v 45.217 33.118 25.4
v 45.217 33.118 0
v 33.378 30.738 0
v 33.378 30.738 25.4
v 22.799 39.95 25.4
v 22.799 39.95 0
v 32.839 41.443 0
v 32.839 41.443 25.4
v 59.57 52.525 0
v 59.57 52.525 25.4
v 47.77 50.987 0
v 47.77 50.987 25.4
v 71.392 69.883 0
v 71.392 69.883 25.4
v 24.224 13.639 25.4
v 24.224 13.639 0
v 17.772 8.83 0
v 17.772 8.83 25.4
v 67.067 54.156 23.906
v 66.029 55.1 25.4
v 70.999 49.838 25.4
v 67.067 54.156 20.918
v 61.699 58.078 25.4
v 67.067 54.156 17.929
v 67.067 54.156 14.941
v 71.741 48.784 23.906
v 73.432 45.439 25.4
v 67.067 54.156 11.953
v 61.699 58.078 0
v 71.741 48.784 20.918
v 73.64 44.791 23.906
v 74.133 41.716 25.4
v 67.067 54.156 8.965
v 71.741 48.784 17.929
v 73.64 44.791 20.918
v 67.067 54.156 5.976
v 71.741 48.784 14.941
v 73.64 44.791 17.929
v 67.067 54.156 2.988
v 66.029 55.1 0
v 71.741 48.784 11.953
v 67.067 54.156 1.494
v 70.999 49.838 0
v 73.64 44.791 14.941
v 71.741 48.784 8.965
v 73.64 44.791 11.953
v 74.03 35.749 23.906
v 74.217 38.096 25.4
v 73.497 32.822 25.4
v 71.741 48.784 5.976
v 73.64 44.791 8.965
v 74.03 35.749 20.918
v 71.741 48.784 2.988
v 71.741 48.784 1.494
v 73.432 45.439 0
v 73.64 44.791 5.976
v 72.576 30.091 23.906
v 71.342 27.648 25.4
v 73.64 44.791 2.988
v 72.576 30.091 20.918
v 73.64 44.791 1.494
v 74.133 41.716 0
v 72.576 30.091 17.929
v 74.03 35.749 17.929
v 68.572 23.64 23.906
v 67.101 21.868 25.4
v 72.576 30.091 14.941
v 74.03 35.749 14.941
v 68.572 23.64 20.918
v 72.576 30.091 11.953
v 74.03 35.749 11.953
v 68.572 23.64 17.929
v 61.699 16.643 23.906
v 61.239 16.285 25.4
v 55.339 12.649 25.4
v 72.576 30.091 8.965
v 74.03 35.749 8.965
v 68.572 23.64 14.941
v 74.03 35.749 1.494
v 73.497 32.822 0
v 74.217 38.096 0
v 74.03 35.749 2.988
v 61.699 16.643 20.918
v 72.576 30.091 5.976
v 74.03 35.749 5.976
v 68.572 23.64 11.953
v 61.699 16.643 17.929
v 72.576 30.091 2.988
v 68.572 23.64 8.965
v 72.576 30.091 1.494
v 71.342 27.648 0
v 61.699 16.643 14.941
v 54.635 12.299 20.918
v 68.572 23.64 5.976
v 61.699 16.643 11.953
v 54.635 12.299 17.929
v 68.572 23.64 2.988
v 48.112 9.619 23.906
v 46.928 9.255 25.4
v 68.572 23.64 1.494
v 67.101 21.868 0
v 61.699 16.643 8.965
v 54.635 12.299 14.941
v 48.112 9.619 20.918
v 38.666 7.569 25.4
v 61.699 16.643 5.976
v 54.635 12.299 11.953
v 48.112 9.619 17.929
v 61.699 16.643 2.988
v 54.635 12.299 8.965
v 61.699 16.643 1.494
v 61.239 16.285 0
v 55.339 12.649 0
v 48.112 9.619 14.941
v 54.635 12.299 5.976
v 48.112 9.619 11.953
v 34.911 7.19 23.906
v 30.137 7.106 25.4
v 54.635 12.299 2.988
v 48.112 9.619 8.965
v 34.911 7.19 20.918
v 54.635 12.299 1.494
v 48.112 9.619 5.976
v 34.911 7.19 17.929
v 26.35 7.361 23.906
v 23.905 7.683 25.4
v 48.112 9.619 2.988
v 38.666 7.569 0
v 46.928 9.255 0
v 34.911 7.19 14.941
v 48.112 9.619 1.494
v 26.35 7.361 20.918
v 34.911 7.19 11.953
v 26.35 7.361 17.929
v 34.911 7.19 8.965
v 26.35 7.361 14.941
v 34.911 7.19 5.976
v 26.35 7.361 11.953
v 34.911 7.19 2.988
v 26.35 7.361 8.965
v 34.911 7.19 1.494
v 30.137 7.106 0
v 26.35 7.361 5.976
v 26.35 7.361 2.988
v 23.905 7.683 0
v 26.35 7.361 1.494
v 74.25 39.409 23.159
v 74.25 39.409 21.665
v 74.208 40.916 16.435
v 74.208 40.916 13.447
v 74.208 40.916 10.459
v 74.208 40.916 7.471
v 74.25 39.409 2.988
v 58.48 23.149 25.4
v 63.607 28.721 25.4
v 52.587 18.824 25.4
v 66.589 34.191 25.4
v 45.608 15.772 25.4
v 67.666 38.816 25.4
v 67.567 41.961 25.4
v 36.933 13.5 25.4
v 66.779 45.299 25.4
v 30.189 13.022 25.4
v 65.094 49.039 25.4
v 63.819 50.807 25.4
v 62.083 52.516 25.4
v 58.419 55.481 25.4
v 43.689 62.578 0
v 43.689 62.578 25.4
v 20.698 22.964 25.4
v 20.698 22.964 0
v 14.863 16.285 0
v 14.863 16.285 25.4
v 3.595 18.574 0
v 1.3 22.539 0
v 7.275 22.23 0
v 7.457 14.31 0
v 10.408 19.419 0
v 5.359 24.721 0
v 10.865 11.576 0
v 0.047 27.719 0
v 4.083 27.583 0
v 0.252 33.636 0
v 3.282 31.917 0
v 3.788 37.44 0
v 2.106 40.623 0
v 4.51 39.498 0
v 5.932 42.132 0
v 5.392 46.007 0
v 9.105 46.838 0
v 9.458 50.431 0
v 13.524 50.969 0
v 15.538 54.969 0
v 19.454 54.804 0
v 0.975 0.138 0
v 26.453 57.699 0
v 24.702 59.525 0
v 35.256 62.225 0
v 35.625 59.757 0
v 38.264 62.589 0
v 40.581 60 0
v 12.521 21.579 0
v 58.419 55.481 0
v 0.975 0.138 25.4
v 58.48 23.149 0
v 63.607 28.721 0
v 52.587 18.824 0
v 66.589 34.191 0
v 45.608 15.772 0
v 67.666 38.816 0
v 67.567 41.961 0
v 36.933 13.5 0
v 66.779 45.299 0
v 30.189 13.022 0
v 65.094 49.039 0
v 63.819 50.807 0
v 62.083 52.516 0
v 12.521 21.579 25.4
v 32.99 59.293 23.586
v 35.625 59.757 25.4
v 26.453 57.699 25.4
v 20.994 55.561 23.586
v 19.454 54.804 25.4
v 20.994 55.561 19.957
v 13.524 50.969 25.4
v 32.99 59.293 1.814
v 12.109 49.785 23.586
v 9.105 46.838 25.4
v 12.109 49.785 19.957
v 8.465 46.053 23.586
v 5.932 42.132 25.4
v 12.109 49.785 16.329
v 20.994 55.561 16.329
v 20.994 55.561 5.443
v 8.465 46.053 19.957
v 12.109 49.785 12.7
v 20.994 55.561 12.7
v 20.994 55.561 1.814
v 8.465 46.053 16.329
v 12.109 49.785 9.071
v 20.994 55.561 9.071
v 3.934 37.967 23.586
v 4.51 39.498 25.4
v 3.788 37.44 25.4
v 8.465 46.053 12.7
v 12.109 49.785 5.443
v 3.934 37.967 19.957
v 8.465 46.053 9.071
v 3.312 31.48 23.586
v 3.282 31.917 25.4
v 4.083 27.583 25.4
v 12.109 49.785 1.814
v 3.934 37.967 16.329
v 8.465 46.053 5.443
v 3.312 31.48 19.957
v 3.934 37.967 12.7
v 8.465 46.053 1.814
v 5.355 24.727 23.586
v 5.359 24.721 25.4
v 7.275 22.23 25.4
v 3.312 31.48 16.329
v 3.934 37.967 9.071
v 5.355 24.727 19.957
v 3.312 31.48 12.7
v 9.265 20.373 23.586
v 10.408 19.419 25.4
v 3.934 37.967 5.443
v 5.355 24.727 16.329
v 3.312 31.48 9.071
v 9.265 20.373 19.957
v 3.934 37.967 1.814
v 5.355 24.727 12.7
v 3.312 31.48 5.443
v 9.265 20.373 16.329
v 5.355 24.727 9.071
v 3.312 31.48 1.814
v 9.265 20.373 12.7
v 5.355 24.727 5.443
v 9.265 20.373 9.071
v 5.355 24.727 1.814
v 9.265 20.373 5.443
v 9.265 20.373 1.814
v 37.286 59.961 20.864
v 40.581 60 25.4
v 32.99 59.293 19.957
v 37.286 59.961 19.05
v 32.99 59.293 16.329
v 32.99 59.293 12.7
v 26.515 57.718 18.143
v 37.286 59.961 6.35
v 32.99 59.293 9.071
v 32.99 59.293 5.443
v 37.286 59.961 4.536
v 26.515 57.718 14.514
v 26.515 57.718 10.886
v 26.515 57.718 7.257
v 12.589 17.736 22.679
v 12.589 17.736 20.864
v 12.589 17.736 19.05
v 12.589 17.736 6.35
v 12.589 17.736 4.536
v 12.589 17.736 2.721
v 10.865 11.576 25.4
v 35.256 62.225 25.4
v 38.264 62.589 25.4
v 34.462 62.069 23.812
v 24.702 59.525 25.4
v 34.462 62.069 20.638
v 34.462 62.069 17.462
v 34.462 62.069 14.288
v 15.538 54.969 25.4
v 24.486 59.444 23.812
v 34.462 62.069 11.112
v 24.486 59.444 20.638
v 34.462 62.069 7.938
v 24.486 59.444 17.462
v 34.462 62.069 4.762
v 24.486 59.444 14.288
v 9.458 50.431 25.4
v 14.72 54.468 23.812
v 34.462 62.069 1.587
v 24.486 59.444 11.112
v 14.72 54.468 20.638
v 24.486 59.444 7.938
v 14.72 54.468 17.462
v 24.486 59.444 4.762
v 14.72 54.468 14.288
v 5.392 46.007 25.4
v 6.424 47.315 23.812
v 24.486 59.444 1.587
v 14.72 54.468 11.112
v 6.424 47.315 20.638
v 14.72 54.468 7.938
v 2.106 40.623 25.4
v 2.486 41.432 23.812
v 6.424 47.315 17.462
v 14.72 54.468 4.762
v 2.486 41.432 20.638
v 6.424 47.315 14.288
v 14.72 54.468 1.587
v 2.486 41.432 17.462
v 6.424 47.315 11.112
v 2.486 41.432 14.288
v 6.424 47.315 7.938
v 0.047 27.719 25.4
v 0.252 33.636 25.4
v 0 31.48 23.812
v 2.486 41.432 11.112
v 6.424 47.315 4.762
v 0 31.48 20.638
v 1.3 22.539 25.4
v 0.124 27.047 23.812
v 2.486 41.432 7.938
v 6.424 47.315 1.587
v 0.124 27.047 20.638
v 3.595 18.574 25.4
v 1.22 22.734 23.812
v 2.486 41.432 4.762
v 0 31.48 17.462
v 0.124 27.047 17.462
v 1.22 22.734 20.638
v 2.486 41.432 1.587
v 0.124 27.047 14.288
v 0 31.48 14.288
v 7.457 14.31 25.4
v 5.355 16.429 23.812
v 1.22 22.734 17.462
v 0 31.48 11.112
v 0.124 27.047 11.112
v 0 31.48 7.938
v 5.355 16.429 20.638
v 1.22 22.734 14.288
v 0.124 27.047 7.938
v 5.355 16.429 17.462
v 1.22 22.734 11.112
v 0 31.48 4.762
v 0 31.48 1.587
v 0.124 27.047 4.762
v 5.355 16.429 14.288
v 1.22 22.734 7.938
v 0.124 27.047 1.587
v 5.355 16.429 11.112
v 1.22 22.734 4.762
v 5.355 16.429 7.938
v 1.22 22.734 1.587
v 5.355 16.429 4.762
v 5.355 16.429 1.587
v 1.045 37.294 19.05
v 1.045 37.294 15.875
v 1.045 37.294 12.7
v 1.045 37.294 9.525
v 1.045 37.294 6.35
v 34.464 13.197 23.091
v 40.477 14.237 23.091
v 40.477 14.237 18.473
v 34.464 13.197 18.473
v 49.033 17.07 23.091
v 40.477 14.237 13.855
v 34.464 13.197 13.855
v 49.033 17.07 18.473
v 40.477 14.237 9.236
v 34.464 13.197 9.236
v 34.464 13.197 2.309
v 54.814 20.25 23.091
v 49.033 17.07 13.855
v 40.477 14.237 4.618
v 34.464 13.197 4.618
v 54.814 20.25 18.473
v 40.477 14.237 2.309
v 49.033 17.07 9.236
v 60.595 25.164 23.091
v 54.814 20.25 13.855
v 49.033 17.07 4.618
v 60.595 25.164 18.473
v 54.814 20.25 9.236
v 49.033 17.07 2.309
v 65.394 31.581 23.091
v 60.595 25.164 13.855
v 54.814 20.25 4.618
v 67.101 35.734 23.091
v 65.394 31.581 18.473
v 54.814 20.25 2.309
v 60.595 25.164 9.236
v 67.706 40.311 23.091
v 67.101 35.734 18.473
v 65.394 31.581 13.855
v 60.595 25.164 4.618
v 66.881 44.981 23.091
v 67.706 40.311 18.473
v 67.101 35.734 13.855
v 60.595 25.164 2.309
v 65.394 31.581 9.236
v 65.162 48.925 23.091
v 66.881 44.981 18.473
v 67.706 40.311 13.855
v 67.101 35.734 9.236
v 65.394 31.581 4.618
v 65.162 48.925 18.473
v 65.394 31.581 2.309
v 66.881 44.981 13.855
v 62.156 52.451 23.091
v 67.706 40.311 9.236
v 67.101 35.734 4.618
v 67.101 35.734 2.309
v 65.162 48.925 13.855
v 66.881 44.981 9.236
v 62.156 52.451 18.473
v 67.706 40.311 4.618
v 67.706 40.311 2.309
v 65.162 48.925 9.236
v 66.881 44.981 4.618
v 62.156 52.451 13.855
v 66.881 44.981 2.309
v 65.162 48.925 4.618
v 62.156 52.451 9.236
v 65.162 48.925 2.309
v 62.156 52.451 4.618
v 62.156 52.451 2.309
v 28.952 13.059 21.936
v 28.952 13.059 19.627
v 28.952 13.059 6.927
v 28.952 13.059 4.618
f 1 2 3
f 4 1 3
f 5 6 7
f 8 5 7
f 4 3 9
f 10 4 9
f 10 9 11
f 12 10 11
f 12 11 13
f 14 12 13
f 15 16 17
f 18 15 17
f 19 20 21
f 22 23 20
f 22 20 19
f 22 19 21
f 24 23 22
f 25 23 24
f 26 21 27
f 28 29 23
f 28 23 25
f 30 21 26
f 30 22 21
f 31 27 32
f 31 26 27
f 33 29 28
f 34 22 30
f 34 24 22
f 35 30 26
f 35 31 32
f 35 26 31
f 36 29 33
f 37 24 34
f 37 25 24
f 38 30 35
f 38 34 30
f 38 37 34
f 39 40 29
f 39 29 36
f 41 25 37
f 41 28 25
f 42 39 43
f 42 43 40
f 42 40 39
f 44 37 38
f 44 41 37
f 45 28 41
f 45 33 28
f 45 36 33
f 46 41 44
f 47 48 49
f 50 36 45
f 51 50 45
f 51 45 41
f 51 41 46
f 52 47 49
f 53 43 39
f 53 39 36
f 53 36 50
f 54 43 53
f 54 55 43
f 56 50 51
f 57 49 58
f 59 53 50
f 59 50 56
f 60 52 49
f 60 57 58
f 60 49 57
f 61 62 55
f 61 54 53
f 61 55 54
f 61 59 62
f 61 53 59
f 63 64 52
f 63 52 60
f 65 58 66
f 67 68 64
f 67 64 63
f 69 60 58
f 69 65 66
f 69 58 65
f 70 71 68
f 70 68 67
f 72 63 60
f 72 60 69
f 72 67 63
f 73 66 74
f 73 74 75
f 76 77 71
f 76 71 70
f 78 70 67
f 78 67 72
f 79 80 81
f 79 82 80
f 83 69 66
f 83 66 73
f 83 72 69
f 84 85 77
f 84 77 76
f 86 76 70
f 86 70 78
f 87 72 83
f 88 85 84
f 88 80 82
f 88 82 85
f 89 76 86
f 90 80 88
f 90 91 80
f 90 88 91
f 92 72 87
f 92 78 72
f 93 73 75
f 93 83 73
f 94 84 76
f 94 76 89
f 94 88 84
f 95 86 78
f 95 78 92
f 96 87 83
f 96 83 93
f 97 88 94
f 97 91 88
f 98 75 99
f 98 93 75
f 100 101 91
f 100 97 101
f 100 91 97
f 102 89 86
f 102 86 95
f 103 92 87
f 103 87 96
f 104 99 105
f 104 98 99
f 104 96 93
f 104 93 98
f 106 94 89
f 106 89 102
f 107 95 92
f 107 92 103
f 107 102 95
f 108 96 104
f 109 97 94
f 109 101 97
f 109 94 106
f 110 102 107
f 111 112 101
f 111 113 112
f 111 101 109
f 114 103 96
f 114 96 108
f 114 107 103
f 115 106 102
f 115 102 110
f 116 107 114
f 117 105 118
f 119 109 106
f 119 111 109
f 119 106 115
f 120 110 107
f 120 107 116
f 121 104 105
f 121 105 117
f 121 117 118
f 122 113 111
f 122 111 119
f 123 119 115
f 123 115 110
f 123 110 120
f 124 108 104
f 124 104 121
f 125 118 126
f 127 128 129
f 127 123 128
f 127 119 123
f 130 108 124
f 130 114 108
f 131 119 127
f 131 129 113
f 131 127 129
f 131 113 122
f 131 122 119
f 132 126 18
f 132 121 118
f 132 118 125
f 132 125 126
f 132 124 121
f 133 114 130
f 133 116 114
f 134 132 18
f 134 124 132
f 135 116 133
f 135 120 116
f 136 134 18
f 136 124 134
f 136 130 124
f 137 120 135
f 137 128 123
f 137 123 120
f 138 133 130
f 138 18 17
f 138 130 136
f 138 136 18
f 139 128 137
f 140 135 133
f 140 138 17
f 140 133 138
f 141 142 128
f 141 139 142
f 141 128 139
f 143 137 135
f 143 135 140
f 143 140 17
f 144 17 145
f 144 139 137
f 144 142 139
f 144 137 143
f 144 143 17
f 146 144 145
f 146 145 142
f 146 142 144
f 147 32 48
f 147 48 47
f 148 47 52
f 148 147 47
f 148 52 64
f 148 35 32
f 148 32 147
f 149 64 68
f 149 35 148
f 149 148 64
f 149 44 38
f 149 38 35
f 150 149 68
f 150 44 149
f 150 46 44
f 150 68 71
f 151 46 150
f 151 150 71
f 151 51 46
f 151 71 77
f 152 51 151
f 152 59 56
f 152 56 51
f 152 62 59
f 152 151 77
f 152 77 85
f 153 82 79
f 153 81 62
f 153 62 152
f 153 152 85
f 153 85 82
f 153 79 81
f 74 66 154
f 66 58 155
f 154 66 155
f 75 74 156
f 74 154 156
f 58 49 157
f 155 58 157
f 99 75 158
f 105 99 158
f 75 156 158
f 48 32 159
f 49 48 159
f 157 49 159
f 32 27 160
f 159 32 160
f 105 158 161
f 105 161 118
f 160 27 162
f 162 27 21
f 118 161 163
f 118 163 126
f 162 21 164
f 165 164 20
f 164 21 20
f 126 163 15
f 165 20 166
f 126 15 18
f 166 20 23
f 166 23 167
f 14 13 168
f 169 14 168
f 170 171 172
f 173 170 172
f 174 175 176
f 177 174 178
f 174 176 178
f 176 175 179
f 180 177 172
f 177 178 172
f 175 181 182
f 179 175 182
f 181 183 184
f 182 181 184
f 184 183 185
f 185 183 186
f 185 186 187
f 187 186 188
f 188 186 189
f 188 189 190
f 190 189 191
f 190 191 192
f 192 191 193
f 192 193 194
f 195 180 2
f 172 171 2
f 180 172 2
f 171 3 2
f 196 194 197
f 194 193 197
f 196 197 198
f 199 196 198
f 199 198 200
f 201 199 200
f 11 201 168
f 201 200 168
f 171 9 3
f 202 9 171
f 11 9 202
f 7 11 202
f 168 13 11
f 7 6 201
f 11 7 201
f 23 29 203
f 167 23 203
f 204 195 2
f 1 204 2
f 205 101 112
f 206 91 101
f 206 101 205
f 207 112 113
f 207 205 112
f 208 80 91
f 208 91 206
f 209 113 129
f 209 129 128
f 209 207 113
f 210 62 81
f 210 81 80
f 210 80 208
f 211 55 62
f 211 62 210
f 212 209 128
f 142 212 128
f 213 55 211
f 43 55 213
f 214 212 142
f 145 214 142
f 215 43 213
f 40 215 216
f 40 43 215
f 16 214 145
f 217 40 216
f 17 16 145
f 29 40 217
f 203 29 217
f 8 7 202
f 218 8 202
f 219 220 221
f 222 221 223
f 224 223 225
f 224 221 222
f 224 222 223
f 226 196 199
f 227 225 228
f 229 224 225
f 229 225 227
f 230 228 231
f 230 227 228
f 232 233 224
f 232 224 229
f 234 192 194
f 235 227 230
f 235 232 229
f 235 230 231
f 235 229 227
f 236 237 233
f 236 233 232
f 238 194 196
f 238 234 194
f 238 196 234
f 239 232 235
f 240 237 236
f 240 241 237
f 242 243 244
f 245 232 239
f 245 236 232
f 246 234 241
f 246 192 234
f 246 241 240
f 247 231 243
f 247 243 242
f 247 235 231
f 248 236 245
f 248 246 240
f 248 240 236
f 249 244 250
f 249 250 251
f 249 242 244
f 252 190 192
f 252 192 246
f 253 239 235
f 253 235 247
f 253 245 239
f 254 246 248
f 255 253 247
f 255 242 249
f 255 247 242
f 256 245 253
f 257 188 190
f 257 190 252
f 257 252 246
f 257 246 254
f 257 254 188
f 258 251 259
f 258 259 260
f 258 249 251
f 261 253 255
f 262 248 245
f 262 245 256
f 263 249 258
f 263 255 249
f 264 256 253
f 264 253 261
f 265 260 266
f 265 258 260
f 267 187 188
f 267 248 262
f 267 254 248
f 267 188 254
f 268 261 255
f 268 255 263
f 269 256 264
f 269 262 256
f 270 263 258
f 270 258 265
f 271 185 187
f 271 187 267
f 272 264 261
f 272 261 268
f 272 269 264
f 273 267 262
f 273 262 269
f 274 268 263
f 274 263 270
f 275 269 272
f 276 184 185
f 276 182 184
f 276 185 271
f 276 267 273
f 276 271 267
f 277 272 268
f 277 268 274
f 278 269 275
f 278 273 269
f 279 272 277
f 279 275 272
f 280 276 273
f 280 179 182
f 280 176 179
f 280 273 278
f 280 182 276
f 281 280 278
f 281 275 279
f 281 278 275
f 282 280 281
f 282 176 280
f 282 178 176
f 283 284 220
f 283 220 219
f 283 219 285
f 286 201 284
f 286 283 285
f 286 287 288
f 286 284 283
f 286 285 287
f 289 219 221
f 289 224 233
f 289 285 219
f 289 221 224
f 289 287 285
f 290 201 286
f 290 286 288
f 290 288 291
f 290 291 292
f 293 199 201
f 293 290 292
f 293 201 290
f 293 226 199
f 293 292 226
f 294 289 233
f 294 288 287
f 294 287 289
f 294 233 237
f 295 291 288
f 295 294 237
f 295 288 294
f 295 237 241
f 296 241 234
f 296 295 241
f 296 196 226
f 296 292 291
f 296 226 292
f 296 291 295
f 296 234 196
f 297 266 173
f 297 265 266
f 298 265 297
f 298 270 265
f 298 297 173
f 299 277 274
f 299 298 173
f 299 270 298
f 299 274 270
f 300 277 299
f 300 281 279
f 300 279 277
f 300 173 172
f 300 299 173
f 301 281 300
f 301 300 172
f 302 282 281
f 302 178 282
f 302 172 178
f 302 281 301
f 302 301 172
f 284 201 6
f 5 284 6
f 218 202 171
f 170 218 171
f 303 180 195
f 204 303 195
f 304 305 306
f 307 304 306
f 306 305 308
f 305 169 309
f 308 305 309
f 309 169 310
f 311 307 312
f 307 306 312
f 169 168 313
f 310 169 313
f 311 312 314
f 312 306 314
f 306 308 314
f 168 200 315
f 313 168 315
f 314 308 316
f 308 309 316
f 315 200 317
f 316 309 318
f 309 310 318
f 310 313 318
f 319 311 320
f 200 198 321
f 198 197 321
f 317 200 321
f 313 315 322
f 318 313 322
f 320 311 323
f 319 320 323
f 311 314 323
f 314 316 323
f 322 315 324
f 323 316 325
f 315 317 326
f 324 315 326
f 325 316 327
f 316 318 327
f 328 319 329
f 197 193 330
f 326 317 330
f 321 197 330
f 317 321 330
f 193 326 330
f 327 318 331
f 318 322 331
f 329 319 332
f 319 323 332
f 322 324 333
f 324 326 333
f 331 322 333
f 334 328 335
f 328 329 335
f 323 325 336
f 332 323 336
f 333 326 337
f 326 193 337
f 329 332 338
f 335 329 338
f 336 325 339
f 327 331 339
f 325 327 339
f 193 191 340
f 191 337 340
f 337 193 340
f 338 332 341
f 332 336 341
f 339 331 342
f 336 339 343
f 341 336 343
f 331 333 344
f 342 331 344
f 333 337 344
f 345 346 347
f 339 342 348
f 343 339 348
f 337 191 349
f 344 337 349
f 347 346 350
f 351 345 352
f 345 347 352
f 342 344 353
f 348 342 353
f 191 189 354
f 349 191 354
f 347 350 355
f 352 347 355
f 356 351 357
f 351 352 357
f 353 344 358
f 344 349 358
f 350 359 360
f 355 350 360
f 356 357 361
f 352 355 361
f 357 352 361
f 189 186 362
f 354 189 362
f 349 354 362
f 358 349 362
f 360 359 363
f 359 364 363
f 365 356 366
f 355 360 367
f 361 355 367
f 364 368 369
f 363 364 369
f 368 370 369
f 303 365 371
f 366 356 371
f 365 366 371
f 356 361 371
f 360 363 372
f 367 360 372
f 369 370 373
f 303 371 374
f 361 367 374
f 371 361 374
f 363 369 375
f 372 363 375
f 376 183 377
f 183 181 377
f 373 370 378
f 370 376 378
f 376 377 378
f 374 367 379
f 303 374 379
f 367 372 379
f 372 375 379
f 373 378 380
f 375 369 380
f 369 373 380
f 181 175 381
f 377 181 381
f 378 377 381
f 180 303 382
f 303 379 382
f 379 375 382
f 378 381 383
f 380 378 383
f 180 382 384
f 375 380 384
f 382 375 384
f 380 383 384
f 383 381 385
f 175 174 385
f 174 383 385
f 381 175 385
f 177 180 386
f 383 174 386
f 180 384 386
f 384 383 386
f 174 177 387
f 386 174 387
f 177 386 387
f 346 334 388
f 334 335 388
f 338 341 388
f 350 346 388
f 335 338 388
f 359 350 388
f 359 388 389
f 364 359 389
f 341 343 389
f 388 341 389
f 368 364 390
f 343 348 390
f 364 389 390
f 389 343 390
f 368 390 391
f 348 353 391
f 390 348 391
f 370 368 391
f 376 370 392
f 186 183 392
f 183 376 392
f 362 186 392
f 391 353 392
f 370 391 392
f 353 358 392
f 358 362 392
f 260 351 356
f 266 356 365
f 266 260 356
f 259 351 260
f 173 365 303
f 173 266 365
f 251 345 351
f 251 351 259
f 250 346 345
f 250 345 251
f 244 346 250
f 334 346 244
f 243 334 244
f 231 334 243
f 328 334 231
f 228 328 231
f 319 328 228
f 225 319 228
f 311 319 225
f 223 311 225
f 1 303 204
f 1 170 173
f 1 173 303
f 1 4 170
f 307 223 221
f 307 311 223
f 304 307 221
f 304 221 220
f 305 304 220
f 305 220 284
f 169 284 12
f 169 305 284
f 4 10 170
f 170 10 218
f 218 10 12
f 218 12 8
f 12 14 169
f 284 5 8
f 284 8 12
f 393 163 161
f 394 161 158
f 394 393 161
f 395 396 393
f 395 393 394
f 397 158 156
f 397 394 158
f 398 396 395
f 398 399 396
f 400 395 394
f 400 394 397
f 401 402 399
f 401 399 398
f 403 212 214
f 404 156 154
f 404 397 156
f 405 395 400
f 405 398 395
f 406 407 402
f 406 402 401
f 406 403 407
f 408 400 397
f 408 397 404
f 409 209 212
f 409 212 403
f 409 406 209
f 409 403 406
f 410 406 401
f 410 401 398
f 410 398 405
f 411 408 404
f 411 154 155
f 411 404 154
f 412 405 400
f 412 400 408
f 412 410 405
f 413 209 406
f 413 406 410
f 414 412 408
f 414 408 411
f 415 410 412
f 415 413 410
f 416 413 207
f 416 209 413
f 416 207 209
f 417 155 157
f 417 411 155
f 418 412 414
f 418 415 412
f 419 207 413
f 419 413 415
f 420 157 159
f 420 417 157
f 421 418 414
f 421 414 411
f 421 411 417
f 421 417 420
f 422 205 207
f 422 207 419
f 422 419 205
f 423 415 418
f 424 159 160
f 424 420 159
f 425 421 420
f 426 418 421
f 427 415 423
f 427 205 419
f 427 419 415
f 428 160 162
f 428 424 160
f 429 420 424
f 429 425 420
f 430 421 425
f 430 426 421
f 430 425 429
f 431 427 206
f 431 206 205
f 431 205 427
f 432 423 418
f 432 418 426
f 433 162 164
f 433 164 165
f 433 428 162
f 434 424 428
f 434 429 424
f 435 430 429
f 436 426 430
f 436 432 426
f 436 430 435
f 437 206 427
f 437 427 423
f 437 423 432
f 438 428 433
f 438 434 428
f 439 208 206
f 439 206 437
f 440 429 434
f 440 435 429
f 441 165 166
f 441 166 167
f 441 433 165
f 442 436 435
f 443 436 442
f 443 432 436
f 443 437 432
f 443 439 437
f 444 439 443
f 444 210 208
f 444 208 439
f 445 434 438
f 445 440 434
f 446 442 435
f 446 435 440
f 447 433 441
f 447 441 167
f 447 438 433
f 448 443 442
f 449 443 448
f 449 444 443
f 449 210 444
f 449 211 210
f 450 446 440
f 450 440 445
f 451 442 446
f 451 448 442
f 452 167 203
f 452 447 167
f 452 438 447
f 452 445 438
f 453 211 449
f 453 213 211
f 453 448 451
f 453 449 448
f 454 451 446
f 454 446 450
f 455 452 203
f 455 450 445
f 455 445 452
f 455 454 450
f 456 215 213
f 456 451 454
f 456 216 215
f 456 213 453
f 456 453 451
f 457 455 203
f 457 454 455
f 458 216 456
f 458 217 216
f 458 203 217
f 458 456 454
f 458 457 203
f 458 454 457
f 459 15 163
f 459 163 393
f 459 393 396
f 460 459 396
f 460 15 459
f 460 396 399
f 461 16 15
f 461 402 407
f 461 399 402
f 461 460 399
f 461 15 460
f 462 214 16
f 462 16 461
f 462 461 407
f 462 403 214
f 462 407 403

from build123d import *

# Parameters (mm, degrees)
F1_DEPTH = 25.4


with BuildPart() as f1:
    # F0 (on Top) → F1 (new body)
    with BuildSketch(Plane.XY):
        with BuildLine():
            Line((10.864504613, 11.5755023435), (0.9747328586, 0.1376004948))
            Line((0.9747328586, 0.1376004948), (45.2174395323, 33.1179872155))
            Line((45.2174395323, 33.1179872155), (33.3783440292, 30.7379085571))
            Line((33.3783440292, 30.7379085571), (59.5699176192, 52.5246672332))
            Line((59.5699176192, 52.5246672332), (47.7696284652, 50.9874224663))
            Line((47.7696284652, 50.9874224663), (71.3923275471, 69.8825776063))
            Line((71.3923275471, 69.8825776063), (43.6887480319, 62.5775828958))
            add(Edge.make_bspline(
                [(43.6887480319, 62.5775828958), (43.0875332361, 62.5716137492), (41.6674151482, 62.5575141411), (37.8806486678, 62.6923448895), (34.455560295, 62.1121427041), (28.961590419, 60.8474777004), (24.419791878, 59.5479441663), (20.5301854243, 57.6795941779), (14.5704239426, 54.5981730751), (10.404192828, 51.3402114328), (6.2927973584, 47.5836774711), (2.2441737221, 41.4848547215), (1.1962828762, 37.9788065394), (-0.4958978716, 31.3176605607), (0.4393403, 22.5494377943), (5.1296002393, 16.4381826749), (8.340547051, 13.4524260424), (10.0741006536, 12.163280817), (10.864504613, 11.5755023435)],
                knots=[0, 0, 0, 0, 0.0393230905, 0.0928843277, 0.1459402353, 0.2120782925, 0.2727584507, 0.3308515796, 0.40286638, 0.4671851532, 0.533772906, 0.608108541, 0.6617575665, 0.7335395787, 0.8165602186, 0.8932761667, 0.9513398719, 1, 1, 1, 1], degree=3))
        make_face()
        with BuildLine():
            add(Edge.make_bspline(
                [(40.5811704695, 59.9996186793), (39.7000493726, 60.0327494149), (37.6577005231, 60.1095430816), (32.8651519299, 59.3389845452), (26.0762103078, 57.7670354296), (21.0251547063, 55.6630928601), (16.1947457049, 53.1243098386), (12.0431276447, 49.8287557563), (8.3074245716, 46.2858663723), (5.5007421926, 41.3914608993), (3.6363485416, 38.0560025966), (2.819103453, 31.3409472628), (4.8792832307, 24.4446089467), (9.0286332959, 20.437323293), (13.1287691762, 17.2655090434), (14.3871791985, 16.5540891382), (14.8631427437, 16.2850115448)],
                knots=[0, 0, 0, 0, 0.0533585134, 0.1236795927, 0.2084451349, 0.2836295249, 0.3576121735, 0.4308488556, 0.5037700814, 0.5784669466, 0.6408484233, 0.7223586051, 0.8071746244, 0.8844167139, 0.9562833817, 1, 1, 1, 1], degree=3))
            Line((40.5811704695, 59.9996186793), (22.7985139936, 39.949581027))
            Line((22.7985139936, 39.949581027), (32.8385718167, 41.443284601))
            Line((32.8385718167, 41.443284601), (12.5205619261, 21.5791575611))
            Line((12.5205619261, 21.5791575611), (20.6975564361, 22.9643043131))
            Line((20.6975564361, 22.9643043131), (14.8631427437, 16.2850115448))
        make_face(mode=Mode.SUBTRACT)
    extrude(amount=F1_DEPTH)


with BuildPart() as f1b:
    # F0 (on Top) → F1, piece 2 (new body)
    with BuildSketch(Plane.XY):
        with BuildLine():
            add(Edge.make_bspline(
                [(61.6992712021, 58.0777078867), (62.593038694, 57.5626037534), (64.4334547811, 56.5019185729), (67.1181674725, 54.1852174022), (69.4860152713, 51.7031416052), (71.8670943599, 48.8919132882), (73.8424457561, 44.9660267371), (74.0945241162, 41.9559591978), (74.3025107047, 40.3110744307), (74.1835021904, 35.4598092693), (72.8781589633, 29.8414033709), (68.7324142248, 23.3895852718), (61.9867761915, 16.2940624552), (54.8208131198, 12.2152282865), (48.1845307282, 9.453187083), (42.0805668666, 8.0323865069), (34.8413293096, 6.9717114456), (26.2725720905, 7.0964514371), (20.6131400772, 8.2502745001), (17.7719438774, 8.8295265688)],
                knots=[0, 0, 0, 0, 0.0448250287, 0.092302198, 0.1390260415, 0.1877941832, 0.2409788153, 0.2837285607, 0.3160106559, 0.3702840764, 0.4314149985, 0.501108459, 0.5803195518, 0.6531562215, 0.7203239803, 0.783247441, 0.851372124, 0.9253845694, 1, 1, 1, 1], degree=3))
            Line((61.6992712021, 58.0777078867), (58.4194585681, 55.4805696011))
            add(Edge.make_bspline(
                [(24.2238212377, 13.6390291154), (25.6041241564, 13.4102615014), (28.5863049853, 12.9160030428), (34.6600126671, 13.0776498931), (40.4757201435, 14.047436597), (49.2246815262, 16.8741168707), (54.8684855773, 20.0247759074), (60.8667850553, 25.0531114094), (65.8232529015, 31.3471325111), (68.8033901799, 40.1447513845), (65.5928400903, 49.1215106568), (62.2891450989, 52.4626345366), (59.7173646751, 54.4683438511), (58.4194585681, 55.4805696011)],
                knots=[0, 0, 0, 0, 0.0734379394, 0.1586646033, 0.2453518248, 0.3507074217, 0.4408496419, 0.5375155853, 0.636853644, 0.7423131031, 0.8474861883, 0.9230305178, 1, 1, 1, 1], degree=3))
            Line((24.2238212377, 13.6390291154), (17.7719438774, 8.8295265688))
        make_face()
    extrude(amount=F1_DEPTH)


solid = Compound([f1.part, f1b.part])
